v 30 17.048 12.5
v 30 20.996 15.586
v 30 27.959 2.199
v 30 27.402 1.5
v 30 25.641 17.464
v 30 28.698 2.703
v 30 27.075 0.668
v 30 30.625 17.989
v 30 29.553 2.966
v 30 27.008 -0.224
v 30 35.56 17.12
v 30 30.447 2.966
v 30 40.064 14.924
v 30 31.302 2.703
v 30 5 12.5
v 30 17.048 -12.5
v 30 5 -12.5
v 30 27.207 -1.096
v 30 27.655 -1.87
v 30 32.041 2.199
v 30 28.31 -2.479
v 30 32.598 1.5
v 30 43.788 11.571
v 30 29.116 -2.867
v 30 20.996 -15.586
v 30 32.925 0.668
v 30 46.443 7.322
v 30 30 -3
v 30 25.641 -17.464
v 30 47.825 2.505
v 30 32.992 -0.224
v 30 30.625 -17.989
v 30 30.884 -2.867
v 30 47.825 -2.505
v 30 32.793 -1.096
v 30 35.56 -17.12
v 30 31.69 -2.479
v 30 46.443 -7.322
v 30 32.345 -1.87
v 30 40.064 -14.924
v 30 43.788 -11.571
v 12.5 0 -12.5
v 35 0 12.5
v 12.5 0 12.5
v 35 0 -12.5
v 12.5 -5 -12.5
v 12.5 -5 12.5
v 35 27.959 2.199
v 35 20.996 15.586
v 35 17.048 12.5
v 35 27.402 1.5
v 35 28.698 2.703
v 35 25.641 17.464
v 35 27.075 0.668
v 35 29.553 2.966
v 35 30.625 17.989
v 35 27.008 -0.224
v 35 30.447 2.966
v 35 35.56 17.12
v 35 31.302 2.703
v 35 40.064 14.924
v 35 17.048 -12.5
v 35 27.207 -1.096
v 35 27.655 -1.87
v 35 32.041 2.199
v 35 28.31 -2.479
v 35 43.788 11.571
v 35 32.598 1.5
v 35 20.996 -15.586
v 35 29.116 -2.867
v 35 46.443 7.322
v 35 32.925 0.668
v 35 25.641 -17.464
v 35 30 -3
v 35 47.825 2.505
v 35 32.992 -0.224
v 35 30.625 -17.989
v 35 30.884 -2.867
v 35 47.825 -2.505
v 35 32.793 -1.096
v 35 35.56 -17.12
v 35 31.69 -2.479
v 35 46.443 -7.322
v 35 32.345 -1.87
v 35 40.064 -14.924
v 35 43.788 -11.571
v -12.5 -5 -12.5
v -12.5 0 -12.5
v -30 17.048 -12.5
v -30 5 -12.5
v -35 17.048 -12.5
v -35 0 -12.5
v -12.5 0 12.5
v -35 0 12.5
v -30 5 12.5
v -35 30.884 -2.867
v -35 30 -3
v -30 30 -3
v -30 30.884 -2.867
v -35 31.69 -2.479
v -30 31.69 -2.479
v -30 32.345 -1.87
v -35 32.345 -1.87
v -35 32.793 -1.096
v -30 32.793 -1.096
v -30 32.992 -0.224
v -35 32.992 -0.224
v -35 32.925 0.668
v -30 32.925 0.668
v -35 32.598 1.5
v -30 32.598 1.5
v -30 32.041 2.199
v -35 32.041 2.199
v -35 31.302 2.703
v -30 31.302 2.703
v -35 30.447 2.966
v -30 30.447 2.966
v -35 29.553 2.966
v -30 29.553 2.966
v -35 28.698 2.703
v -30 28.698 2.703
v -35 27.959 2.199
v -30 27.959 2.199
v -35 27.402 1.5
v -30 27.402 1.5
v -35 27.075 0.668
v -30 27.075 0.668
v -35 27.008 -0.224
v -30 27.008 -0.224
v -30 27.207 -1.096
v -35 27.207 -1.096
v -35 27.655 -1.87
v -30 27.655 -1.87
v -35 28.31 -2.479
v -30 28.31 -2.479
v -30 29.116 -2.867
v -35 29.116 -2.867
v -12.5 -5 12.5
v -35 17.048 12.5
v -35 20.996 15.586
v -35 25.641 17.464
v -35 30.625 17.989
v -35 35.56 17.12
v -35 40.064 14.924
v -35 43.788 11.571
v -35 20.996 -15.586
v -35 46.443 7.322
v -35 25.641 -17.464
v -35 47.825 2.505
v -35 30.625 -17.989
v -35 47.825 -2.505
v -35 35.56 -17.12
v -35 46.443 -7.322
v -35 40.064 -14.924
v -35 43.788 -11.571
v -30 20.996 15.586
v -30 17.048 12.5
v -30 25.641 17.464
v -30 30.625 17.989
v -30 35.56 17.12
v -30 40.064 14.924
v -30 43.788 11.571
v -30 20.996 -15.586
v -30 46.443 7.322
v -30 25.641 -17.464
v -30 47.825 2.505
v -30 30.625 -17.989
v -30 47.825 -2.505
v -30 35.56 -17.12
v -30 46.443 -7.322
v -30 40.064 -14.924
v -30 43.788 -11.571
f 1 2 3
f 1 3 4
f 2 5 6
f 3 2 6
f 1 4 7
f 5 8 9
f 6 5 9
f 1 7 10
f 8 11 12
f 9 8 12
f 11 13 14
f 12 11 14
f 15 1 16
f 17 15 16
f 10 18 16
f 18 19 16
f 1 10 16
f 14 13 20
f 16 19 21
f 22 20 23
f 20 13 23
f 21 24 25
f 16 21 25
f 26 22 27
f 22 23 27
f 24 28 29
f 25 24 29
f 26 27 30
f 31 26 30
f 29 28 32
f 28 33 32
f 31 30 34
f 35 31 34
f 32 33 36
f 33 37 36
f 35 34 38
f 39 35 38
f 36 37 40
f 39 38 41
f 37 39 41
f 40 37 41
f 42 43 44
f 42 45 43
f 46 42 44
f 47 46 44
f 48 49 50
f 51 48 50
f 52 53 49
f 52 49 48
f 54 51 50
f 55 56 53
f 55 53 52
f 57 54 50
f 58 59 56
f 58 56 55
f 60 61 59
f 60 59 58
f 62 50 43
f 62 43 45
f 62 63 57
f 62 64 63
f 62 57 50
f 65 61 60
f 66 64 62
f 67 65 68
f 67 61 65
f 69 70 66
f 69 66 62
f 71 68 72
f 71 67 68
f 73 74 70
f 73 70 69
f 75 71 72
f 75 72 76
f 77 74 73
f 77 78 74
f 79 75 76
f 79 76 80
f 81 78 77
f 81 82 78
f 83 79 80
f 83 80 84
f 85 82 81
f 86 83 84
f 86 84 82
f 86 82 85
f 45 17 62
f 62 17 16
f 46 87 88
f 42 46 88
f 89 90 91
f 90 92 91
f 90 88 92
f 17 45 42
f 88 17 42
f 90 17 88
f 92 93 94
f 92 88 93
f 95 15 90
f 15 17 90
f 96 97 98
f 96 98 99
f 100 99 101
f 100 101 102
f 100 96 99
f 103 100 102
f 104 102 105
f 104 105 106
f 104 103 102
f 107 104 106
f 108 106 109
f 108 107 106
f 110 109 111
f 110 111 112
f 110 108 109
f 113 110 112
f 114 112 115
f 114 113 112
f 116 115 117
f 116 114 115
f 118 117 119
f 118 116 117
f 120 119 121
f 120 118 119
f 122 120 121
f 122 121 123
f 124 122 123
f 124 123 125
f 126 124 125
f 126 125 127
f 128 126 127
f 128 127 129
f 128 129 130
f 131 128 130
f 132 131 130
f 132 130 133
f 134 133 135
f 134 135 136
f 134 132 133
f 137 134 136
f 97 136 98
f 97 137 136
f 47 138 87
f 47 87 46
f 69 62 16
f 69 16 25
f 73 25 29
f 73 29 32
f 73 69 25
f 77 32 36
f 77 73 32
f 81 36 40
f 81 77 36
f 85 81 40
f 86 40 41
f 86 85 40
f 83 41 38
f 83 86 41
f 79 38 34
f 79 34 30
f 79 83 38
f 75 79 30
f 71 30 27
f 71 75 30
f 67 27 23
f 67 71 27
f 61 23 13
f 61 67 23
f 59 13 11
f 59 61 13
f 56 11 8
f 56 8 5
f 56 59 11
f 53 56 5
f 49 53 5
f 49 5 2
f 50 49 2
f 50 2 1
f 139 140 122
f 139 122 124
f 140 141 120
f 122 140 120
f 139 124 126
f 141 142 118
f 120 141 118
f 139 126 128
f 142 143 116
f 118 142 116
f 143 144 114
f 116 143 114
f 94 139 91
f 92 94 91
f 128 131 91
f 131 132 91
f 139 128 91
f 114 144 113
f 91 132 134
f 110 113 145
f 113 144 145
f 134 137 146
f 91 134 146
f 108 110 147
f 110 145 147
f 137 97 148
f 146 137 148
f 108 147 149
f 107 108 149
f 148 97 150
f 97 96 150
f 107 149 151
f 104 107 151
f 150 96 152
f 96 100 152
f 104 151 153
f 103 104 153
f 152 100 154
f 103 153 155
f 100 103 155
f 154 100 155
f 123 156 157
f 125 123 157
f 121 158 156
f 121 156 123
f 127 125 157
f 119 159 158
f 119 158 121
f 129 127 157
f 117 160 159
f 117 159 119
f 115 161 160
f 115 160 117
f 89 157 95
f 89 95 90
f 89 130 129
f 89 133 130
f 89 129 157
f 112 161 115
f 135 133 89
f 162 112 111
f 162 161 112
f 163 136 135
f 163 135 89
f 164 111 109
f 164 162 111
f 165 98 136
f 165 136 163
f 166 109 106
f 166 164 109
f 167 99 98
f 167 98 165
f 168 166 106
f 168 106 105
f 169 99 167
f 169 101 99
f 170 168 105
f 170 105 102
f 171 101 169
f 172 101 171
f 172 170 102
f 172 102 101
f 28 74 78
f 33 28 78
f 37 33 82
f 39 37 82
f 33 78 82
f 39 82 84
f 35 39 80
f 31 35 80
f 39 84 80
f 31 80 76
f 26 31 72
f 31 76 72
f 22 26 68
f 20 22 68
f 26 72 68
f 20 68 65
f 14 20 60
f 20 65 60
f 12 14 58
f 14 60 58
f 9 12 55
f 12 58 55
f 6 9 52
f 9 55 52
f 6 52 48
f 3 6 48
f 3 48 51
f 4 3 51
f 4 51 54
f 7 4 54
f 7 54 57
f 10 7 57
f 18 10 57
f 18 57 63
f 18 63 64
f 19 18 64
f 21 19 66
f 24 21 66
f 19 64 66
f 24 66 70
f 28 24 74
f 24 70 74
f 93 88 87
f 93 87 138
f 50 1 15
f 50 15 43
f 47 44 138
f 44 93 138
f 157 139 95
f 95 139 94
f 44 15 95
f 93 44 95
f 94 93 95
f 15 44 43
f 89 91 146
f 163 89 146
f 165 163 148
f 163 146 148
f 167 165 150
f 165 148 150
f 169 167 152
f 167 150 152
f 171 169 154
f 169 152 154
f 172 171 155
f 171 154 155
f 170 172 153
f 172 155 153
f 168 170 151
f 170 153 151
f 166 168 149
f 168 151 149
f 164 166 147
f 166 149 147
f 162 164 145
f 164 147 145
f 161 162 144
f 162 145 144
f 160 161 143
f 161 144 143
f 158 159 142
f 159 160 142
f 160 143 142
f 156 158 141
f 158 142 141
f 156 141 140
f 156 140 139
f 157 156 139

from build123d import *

# Parameters (mm, degrees)
SKETCH1_W           = 35
SKETCH1_H           = 25
BOSS_EXTRUDE1_DEPTH = 5
SKETCH7_R           = 18
SKETCH7_R_2         = 3
BOSS_EXTRUDE2_DEPTH = 5
SKETCH8_W           = 25
SKETCH8_H           = 25
BOSS_EXTRUDE3_DEPTH = 5


with BuildPart() as part:
    # Sketch1 → Boss-Extrude1 (new body)
    with BuildSketch(Plane(origin=(0, 0, 0), x_dir=(1, 0, 0), z_dir=(0, 1, 0))):
        with Locations((17.5, 0)):
            Rectangle(SKETCH1_W, SKETCH1_H)
    boss_extrude1 = extrude(amount=BOSS_EXTRUDE1_DEPTH)

    # Sketch7 → Boss-Extrude2 (add)
    # profile 1 of 2: a face of its own
    with BuildSketch(Plane(origin=(35, 0, 0), x_dir=(0, 0, -1), z_dir=(1, 0, 0))):
        with Locations((0, 30)):
            Circle(SKETCH7_R)
        with Locations((0, 30)):
            Circle(SKETCH7_R_2, mode=Mode.SUBTRACT)
    # profile 2 of 2: a face of its own
    with BuildSketch(Plane(origin=(35, 0, 0), x_dir=(0, 0, -1), z_dir=(1, 0, 0))):
        with BuildLine():
            Line((-12.5, 17.048166153), (-12.5, 5))
            Line((-12.5, 5), (12.5, 5))
            Line((12.5, 5), (12.5, 17.048166153))
            ThreePointArc((12.5, 17.048166153), (0, 12), (-12.5, 17.048166153))
        make_face()
    boss_extrude2 = extrude(amount=-BOSS_EXTRUDE2_DEPTH)

    # Mirror1: Boss-Extrude1, Boss-Extrude2 across plane
    add(boss_extrude1.mirror(Plane(origin=(0, 5, -12.5), x_dir=(0, 0, 1), z_dir=(1, 0, 0))))
    add(boss_extrude2.mirror(Plane(origin=(0, 5, -12.5), x_dir=(0, 0, 1), z_dir=(1, 0, 0))))

    # Sketch8 → Boss-Extrude3 (add)
    with BuildSketch(Plane.XZ):
        Rectangle(SKETCH8_W, SKETCH8_H)
    extrude(amount=BOSS_EXTRUDE3_DEPTH)


solid = part.part
